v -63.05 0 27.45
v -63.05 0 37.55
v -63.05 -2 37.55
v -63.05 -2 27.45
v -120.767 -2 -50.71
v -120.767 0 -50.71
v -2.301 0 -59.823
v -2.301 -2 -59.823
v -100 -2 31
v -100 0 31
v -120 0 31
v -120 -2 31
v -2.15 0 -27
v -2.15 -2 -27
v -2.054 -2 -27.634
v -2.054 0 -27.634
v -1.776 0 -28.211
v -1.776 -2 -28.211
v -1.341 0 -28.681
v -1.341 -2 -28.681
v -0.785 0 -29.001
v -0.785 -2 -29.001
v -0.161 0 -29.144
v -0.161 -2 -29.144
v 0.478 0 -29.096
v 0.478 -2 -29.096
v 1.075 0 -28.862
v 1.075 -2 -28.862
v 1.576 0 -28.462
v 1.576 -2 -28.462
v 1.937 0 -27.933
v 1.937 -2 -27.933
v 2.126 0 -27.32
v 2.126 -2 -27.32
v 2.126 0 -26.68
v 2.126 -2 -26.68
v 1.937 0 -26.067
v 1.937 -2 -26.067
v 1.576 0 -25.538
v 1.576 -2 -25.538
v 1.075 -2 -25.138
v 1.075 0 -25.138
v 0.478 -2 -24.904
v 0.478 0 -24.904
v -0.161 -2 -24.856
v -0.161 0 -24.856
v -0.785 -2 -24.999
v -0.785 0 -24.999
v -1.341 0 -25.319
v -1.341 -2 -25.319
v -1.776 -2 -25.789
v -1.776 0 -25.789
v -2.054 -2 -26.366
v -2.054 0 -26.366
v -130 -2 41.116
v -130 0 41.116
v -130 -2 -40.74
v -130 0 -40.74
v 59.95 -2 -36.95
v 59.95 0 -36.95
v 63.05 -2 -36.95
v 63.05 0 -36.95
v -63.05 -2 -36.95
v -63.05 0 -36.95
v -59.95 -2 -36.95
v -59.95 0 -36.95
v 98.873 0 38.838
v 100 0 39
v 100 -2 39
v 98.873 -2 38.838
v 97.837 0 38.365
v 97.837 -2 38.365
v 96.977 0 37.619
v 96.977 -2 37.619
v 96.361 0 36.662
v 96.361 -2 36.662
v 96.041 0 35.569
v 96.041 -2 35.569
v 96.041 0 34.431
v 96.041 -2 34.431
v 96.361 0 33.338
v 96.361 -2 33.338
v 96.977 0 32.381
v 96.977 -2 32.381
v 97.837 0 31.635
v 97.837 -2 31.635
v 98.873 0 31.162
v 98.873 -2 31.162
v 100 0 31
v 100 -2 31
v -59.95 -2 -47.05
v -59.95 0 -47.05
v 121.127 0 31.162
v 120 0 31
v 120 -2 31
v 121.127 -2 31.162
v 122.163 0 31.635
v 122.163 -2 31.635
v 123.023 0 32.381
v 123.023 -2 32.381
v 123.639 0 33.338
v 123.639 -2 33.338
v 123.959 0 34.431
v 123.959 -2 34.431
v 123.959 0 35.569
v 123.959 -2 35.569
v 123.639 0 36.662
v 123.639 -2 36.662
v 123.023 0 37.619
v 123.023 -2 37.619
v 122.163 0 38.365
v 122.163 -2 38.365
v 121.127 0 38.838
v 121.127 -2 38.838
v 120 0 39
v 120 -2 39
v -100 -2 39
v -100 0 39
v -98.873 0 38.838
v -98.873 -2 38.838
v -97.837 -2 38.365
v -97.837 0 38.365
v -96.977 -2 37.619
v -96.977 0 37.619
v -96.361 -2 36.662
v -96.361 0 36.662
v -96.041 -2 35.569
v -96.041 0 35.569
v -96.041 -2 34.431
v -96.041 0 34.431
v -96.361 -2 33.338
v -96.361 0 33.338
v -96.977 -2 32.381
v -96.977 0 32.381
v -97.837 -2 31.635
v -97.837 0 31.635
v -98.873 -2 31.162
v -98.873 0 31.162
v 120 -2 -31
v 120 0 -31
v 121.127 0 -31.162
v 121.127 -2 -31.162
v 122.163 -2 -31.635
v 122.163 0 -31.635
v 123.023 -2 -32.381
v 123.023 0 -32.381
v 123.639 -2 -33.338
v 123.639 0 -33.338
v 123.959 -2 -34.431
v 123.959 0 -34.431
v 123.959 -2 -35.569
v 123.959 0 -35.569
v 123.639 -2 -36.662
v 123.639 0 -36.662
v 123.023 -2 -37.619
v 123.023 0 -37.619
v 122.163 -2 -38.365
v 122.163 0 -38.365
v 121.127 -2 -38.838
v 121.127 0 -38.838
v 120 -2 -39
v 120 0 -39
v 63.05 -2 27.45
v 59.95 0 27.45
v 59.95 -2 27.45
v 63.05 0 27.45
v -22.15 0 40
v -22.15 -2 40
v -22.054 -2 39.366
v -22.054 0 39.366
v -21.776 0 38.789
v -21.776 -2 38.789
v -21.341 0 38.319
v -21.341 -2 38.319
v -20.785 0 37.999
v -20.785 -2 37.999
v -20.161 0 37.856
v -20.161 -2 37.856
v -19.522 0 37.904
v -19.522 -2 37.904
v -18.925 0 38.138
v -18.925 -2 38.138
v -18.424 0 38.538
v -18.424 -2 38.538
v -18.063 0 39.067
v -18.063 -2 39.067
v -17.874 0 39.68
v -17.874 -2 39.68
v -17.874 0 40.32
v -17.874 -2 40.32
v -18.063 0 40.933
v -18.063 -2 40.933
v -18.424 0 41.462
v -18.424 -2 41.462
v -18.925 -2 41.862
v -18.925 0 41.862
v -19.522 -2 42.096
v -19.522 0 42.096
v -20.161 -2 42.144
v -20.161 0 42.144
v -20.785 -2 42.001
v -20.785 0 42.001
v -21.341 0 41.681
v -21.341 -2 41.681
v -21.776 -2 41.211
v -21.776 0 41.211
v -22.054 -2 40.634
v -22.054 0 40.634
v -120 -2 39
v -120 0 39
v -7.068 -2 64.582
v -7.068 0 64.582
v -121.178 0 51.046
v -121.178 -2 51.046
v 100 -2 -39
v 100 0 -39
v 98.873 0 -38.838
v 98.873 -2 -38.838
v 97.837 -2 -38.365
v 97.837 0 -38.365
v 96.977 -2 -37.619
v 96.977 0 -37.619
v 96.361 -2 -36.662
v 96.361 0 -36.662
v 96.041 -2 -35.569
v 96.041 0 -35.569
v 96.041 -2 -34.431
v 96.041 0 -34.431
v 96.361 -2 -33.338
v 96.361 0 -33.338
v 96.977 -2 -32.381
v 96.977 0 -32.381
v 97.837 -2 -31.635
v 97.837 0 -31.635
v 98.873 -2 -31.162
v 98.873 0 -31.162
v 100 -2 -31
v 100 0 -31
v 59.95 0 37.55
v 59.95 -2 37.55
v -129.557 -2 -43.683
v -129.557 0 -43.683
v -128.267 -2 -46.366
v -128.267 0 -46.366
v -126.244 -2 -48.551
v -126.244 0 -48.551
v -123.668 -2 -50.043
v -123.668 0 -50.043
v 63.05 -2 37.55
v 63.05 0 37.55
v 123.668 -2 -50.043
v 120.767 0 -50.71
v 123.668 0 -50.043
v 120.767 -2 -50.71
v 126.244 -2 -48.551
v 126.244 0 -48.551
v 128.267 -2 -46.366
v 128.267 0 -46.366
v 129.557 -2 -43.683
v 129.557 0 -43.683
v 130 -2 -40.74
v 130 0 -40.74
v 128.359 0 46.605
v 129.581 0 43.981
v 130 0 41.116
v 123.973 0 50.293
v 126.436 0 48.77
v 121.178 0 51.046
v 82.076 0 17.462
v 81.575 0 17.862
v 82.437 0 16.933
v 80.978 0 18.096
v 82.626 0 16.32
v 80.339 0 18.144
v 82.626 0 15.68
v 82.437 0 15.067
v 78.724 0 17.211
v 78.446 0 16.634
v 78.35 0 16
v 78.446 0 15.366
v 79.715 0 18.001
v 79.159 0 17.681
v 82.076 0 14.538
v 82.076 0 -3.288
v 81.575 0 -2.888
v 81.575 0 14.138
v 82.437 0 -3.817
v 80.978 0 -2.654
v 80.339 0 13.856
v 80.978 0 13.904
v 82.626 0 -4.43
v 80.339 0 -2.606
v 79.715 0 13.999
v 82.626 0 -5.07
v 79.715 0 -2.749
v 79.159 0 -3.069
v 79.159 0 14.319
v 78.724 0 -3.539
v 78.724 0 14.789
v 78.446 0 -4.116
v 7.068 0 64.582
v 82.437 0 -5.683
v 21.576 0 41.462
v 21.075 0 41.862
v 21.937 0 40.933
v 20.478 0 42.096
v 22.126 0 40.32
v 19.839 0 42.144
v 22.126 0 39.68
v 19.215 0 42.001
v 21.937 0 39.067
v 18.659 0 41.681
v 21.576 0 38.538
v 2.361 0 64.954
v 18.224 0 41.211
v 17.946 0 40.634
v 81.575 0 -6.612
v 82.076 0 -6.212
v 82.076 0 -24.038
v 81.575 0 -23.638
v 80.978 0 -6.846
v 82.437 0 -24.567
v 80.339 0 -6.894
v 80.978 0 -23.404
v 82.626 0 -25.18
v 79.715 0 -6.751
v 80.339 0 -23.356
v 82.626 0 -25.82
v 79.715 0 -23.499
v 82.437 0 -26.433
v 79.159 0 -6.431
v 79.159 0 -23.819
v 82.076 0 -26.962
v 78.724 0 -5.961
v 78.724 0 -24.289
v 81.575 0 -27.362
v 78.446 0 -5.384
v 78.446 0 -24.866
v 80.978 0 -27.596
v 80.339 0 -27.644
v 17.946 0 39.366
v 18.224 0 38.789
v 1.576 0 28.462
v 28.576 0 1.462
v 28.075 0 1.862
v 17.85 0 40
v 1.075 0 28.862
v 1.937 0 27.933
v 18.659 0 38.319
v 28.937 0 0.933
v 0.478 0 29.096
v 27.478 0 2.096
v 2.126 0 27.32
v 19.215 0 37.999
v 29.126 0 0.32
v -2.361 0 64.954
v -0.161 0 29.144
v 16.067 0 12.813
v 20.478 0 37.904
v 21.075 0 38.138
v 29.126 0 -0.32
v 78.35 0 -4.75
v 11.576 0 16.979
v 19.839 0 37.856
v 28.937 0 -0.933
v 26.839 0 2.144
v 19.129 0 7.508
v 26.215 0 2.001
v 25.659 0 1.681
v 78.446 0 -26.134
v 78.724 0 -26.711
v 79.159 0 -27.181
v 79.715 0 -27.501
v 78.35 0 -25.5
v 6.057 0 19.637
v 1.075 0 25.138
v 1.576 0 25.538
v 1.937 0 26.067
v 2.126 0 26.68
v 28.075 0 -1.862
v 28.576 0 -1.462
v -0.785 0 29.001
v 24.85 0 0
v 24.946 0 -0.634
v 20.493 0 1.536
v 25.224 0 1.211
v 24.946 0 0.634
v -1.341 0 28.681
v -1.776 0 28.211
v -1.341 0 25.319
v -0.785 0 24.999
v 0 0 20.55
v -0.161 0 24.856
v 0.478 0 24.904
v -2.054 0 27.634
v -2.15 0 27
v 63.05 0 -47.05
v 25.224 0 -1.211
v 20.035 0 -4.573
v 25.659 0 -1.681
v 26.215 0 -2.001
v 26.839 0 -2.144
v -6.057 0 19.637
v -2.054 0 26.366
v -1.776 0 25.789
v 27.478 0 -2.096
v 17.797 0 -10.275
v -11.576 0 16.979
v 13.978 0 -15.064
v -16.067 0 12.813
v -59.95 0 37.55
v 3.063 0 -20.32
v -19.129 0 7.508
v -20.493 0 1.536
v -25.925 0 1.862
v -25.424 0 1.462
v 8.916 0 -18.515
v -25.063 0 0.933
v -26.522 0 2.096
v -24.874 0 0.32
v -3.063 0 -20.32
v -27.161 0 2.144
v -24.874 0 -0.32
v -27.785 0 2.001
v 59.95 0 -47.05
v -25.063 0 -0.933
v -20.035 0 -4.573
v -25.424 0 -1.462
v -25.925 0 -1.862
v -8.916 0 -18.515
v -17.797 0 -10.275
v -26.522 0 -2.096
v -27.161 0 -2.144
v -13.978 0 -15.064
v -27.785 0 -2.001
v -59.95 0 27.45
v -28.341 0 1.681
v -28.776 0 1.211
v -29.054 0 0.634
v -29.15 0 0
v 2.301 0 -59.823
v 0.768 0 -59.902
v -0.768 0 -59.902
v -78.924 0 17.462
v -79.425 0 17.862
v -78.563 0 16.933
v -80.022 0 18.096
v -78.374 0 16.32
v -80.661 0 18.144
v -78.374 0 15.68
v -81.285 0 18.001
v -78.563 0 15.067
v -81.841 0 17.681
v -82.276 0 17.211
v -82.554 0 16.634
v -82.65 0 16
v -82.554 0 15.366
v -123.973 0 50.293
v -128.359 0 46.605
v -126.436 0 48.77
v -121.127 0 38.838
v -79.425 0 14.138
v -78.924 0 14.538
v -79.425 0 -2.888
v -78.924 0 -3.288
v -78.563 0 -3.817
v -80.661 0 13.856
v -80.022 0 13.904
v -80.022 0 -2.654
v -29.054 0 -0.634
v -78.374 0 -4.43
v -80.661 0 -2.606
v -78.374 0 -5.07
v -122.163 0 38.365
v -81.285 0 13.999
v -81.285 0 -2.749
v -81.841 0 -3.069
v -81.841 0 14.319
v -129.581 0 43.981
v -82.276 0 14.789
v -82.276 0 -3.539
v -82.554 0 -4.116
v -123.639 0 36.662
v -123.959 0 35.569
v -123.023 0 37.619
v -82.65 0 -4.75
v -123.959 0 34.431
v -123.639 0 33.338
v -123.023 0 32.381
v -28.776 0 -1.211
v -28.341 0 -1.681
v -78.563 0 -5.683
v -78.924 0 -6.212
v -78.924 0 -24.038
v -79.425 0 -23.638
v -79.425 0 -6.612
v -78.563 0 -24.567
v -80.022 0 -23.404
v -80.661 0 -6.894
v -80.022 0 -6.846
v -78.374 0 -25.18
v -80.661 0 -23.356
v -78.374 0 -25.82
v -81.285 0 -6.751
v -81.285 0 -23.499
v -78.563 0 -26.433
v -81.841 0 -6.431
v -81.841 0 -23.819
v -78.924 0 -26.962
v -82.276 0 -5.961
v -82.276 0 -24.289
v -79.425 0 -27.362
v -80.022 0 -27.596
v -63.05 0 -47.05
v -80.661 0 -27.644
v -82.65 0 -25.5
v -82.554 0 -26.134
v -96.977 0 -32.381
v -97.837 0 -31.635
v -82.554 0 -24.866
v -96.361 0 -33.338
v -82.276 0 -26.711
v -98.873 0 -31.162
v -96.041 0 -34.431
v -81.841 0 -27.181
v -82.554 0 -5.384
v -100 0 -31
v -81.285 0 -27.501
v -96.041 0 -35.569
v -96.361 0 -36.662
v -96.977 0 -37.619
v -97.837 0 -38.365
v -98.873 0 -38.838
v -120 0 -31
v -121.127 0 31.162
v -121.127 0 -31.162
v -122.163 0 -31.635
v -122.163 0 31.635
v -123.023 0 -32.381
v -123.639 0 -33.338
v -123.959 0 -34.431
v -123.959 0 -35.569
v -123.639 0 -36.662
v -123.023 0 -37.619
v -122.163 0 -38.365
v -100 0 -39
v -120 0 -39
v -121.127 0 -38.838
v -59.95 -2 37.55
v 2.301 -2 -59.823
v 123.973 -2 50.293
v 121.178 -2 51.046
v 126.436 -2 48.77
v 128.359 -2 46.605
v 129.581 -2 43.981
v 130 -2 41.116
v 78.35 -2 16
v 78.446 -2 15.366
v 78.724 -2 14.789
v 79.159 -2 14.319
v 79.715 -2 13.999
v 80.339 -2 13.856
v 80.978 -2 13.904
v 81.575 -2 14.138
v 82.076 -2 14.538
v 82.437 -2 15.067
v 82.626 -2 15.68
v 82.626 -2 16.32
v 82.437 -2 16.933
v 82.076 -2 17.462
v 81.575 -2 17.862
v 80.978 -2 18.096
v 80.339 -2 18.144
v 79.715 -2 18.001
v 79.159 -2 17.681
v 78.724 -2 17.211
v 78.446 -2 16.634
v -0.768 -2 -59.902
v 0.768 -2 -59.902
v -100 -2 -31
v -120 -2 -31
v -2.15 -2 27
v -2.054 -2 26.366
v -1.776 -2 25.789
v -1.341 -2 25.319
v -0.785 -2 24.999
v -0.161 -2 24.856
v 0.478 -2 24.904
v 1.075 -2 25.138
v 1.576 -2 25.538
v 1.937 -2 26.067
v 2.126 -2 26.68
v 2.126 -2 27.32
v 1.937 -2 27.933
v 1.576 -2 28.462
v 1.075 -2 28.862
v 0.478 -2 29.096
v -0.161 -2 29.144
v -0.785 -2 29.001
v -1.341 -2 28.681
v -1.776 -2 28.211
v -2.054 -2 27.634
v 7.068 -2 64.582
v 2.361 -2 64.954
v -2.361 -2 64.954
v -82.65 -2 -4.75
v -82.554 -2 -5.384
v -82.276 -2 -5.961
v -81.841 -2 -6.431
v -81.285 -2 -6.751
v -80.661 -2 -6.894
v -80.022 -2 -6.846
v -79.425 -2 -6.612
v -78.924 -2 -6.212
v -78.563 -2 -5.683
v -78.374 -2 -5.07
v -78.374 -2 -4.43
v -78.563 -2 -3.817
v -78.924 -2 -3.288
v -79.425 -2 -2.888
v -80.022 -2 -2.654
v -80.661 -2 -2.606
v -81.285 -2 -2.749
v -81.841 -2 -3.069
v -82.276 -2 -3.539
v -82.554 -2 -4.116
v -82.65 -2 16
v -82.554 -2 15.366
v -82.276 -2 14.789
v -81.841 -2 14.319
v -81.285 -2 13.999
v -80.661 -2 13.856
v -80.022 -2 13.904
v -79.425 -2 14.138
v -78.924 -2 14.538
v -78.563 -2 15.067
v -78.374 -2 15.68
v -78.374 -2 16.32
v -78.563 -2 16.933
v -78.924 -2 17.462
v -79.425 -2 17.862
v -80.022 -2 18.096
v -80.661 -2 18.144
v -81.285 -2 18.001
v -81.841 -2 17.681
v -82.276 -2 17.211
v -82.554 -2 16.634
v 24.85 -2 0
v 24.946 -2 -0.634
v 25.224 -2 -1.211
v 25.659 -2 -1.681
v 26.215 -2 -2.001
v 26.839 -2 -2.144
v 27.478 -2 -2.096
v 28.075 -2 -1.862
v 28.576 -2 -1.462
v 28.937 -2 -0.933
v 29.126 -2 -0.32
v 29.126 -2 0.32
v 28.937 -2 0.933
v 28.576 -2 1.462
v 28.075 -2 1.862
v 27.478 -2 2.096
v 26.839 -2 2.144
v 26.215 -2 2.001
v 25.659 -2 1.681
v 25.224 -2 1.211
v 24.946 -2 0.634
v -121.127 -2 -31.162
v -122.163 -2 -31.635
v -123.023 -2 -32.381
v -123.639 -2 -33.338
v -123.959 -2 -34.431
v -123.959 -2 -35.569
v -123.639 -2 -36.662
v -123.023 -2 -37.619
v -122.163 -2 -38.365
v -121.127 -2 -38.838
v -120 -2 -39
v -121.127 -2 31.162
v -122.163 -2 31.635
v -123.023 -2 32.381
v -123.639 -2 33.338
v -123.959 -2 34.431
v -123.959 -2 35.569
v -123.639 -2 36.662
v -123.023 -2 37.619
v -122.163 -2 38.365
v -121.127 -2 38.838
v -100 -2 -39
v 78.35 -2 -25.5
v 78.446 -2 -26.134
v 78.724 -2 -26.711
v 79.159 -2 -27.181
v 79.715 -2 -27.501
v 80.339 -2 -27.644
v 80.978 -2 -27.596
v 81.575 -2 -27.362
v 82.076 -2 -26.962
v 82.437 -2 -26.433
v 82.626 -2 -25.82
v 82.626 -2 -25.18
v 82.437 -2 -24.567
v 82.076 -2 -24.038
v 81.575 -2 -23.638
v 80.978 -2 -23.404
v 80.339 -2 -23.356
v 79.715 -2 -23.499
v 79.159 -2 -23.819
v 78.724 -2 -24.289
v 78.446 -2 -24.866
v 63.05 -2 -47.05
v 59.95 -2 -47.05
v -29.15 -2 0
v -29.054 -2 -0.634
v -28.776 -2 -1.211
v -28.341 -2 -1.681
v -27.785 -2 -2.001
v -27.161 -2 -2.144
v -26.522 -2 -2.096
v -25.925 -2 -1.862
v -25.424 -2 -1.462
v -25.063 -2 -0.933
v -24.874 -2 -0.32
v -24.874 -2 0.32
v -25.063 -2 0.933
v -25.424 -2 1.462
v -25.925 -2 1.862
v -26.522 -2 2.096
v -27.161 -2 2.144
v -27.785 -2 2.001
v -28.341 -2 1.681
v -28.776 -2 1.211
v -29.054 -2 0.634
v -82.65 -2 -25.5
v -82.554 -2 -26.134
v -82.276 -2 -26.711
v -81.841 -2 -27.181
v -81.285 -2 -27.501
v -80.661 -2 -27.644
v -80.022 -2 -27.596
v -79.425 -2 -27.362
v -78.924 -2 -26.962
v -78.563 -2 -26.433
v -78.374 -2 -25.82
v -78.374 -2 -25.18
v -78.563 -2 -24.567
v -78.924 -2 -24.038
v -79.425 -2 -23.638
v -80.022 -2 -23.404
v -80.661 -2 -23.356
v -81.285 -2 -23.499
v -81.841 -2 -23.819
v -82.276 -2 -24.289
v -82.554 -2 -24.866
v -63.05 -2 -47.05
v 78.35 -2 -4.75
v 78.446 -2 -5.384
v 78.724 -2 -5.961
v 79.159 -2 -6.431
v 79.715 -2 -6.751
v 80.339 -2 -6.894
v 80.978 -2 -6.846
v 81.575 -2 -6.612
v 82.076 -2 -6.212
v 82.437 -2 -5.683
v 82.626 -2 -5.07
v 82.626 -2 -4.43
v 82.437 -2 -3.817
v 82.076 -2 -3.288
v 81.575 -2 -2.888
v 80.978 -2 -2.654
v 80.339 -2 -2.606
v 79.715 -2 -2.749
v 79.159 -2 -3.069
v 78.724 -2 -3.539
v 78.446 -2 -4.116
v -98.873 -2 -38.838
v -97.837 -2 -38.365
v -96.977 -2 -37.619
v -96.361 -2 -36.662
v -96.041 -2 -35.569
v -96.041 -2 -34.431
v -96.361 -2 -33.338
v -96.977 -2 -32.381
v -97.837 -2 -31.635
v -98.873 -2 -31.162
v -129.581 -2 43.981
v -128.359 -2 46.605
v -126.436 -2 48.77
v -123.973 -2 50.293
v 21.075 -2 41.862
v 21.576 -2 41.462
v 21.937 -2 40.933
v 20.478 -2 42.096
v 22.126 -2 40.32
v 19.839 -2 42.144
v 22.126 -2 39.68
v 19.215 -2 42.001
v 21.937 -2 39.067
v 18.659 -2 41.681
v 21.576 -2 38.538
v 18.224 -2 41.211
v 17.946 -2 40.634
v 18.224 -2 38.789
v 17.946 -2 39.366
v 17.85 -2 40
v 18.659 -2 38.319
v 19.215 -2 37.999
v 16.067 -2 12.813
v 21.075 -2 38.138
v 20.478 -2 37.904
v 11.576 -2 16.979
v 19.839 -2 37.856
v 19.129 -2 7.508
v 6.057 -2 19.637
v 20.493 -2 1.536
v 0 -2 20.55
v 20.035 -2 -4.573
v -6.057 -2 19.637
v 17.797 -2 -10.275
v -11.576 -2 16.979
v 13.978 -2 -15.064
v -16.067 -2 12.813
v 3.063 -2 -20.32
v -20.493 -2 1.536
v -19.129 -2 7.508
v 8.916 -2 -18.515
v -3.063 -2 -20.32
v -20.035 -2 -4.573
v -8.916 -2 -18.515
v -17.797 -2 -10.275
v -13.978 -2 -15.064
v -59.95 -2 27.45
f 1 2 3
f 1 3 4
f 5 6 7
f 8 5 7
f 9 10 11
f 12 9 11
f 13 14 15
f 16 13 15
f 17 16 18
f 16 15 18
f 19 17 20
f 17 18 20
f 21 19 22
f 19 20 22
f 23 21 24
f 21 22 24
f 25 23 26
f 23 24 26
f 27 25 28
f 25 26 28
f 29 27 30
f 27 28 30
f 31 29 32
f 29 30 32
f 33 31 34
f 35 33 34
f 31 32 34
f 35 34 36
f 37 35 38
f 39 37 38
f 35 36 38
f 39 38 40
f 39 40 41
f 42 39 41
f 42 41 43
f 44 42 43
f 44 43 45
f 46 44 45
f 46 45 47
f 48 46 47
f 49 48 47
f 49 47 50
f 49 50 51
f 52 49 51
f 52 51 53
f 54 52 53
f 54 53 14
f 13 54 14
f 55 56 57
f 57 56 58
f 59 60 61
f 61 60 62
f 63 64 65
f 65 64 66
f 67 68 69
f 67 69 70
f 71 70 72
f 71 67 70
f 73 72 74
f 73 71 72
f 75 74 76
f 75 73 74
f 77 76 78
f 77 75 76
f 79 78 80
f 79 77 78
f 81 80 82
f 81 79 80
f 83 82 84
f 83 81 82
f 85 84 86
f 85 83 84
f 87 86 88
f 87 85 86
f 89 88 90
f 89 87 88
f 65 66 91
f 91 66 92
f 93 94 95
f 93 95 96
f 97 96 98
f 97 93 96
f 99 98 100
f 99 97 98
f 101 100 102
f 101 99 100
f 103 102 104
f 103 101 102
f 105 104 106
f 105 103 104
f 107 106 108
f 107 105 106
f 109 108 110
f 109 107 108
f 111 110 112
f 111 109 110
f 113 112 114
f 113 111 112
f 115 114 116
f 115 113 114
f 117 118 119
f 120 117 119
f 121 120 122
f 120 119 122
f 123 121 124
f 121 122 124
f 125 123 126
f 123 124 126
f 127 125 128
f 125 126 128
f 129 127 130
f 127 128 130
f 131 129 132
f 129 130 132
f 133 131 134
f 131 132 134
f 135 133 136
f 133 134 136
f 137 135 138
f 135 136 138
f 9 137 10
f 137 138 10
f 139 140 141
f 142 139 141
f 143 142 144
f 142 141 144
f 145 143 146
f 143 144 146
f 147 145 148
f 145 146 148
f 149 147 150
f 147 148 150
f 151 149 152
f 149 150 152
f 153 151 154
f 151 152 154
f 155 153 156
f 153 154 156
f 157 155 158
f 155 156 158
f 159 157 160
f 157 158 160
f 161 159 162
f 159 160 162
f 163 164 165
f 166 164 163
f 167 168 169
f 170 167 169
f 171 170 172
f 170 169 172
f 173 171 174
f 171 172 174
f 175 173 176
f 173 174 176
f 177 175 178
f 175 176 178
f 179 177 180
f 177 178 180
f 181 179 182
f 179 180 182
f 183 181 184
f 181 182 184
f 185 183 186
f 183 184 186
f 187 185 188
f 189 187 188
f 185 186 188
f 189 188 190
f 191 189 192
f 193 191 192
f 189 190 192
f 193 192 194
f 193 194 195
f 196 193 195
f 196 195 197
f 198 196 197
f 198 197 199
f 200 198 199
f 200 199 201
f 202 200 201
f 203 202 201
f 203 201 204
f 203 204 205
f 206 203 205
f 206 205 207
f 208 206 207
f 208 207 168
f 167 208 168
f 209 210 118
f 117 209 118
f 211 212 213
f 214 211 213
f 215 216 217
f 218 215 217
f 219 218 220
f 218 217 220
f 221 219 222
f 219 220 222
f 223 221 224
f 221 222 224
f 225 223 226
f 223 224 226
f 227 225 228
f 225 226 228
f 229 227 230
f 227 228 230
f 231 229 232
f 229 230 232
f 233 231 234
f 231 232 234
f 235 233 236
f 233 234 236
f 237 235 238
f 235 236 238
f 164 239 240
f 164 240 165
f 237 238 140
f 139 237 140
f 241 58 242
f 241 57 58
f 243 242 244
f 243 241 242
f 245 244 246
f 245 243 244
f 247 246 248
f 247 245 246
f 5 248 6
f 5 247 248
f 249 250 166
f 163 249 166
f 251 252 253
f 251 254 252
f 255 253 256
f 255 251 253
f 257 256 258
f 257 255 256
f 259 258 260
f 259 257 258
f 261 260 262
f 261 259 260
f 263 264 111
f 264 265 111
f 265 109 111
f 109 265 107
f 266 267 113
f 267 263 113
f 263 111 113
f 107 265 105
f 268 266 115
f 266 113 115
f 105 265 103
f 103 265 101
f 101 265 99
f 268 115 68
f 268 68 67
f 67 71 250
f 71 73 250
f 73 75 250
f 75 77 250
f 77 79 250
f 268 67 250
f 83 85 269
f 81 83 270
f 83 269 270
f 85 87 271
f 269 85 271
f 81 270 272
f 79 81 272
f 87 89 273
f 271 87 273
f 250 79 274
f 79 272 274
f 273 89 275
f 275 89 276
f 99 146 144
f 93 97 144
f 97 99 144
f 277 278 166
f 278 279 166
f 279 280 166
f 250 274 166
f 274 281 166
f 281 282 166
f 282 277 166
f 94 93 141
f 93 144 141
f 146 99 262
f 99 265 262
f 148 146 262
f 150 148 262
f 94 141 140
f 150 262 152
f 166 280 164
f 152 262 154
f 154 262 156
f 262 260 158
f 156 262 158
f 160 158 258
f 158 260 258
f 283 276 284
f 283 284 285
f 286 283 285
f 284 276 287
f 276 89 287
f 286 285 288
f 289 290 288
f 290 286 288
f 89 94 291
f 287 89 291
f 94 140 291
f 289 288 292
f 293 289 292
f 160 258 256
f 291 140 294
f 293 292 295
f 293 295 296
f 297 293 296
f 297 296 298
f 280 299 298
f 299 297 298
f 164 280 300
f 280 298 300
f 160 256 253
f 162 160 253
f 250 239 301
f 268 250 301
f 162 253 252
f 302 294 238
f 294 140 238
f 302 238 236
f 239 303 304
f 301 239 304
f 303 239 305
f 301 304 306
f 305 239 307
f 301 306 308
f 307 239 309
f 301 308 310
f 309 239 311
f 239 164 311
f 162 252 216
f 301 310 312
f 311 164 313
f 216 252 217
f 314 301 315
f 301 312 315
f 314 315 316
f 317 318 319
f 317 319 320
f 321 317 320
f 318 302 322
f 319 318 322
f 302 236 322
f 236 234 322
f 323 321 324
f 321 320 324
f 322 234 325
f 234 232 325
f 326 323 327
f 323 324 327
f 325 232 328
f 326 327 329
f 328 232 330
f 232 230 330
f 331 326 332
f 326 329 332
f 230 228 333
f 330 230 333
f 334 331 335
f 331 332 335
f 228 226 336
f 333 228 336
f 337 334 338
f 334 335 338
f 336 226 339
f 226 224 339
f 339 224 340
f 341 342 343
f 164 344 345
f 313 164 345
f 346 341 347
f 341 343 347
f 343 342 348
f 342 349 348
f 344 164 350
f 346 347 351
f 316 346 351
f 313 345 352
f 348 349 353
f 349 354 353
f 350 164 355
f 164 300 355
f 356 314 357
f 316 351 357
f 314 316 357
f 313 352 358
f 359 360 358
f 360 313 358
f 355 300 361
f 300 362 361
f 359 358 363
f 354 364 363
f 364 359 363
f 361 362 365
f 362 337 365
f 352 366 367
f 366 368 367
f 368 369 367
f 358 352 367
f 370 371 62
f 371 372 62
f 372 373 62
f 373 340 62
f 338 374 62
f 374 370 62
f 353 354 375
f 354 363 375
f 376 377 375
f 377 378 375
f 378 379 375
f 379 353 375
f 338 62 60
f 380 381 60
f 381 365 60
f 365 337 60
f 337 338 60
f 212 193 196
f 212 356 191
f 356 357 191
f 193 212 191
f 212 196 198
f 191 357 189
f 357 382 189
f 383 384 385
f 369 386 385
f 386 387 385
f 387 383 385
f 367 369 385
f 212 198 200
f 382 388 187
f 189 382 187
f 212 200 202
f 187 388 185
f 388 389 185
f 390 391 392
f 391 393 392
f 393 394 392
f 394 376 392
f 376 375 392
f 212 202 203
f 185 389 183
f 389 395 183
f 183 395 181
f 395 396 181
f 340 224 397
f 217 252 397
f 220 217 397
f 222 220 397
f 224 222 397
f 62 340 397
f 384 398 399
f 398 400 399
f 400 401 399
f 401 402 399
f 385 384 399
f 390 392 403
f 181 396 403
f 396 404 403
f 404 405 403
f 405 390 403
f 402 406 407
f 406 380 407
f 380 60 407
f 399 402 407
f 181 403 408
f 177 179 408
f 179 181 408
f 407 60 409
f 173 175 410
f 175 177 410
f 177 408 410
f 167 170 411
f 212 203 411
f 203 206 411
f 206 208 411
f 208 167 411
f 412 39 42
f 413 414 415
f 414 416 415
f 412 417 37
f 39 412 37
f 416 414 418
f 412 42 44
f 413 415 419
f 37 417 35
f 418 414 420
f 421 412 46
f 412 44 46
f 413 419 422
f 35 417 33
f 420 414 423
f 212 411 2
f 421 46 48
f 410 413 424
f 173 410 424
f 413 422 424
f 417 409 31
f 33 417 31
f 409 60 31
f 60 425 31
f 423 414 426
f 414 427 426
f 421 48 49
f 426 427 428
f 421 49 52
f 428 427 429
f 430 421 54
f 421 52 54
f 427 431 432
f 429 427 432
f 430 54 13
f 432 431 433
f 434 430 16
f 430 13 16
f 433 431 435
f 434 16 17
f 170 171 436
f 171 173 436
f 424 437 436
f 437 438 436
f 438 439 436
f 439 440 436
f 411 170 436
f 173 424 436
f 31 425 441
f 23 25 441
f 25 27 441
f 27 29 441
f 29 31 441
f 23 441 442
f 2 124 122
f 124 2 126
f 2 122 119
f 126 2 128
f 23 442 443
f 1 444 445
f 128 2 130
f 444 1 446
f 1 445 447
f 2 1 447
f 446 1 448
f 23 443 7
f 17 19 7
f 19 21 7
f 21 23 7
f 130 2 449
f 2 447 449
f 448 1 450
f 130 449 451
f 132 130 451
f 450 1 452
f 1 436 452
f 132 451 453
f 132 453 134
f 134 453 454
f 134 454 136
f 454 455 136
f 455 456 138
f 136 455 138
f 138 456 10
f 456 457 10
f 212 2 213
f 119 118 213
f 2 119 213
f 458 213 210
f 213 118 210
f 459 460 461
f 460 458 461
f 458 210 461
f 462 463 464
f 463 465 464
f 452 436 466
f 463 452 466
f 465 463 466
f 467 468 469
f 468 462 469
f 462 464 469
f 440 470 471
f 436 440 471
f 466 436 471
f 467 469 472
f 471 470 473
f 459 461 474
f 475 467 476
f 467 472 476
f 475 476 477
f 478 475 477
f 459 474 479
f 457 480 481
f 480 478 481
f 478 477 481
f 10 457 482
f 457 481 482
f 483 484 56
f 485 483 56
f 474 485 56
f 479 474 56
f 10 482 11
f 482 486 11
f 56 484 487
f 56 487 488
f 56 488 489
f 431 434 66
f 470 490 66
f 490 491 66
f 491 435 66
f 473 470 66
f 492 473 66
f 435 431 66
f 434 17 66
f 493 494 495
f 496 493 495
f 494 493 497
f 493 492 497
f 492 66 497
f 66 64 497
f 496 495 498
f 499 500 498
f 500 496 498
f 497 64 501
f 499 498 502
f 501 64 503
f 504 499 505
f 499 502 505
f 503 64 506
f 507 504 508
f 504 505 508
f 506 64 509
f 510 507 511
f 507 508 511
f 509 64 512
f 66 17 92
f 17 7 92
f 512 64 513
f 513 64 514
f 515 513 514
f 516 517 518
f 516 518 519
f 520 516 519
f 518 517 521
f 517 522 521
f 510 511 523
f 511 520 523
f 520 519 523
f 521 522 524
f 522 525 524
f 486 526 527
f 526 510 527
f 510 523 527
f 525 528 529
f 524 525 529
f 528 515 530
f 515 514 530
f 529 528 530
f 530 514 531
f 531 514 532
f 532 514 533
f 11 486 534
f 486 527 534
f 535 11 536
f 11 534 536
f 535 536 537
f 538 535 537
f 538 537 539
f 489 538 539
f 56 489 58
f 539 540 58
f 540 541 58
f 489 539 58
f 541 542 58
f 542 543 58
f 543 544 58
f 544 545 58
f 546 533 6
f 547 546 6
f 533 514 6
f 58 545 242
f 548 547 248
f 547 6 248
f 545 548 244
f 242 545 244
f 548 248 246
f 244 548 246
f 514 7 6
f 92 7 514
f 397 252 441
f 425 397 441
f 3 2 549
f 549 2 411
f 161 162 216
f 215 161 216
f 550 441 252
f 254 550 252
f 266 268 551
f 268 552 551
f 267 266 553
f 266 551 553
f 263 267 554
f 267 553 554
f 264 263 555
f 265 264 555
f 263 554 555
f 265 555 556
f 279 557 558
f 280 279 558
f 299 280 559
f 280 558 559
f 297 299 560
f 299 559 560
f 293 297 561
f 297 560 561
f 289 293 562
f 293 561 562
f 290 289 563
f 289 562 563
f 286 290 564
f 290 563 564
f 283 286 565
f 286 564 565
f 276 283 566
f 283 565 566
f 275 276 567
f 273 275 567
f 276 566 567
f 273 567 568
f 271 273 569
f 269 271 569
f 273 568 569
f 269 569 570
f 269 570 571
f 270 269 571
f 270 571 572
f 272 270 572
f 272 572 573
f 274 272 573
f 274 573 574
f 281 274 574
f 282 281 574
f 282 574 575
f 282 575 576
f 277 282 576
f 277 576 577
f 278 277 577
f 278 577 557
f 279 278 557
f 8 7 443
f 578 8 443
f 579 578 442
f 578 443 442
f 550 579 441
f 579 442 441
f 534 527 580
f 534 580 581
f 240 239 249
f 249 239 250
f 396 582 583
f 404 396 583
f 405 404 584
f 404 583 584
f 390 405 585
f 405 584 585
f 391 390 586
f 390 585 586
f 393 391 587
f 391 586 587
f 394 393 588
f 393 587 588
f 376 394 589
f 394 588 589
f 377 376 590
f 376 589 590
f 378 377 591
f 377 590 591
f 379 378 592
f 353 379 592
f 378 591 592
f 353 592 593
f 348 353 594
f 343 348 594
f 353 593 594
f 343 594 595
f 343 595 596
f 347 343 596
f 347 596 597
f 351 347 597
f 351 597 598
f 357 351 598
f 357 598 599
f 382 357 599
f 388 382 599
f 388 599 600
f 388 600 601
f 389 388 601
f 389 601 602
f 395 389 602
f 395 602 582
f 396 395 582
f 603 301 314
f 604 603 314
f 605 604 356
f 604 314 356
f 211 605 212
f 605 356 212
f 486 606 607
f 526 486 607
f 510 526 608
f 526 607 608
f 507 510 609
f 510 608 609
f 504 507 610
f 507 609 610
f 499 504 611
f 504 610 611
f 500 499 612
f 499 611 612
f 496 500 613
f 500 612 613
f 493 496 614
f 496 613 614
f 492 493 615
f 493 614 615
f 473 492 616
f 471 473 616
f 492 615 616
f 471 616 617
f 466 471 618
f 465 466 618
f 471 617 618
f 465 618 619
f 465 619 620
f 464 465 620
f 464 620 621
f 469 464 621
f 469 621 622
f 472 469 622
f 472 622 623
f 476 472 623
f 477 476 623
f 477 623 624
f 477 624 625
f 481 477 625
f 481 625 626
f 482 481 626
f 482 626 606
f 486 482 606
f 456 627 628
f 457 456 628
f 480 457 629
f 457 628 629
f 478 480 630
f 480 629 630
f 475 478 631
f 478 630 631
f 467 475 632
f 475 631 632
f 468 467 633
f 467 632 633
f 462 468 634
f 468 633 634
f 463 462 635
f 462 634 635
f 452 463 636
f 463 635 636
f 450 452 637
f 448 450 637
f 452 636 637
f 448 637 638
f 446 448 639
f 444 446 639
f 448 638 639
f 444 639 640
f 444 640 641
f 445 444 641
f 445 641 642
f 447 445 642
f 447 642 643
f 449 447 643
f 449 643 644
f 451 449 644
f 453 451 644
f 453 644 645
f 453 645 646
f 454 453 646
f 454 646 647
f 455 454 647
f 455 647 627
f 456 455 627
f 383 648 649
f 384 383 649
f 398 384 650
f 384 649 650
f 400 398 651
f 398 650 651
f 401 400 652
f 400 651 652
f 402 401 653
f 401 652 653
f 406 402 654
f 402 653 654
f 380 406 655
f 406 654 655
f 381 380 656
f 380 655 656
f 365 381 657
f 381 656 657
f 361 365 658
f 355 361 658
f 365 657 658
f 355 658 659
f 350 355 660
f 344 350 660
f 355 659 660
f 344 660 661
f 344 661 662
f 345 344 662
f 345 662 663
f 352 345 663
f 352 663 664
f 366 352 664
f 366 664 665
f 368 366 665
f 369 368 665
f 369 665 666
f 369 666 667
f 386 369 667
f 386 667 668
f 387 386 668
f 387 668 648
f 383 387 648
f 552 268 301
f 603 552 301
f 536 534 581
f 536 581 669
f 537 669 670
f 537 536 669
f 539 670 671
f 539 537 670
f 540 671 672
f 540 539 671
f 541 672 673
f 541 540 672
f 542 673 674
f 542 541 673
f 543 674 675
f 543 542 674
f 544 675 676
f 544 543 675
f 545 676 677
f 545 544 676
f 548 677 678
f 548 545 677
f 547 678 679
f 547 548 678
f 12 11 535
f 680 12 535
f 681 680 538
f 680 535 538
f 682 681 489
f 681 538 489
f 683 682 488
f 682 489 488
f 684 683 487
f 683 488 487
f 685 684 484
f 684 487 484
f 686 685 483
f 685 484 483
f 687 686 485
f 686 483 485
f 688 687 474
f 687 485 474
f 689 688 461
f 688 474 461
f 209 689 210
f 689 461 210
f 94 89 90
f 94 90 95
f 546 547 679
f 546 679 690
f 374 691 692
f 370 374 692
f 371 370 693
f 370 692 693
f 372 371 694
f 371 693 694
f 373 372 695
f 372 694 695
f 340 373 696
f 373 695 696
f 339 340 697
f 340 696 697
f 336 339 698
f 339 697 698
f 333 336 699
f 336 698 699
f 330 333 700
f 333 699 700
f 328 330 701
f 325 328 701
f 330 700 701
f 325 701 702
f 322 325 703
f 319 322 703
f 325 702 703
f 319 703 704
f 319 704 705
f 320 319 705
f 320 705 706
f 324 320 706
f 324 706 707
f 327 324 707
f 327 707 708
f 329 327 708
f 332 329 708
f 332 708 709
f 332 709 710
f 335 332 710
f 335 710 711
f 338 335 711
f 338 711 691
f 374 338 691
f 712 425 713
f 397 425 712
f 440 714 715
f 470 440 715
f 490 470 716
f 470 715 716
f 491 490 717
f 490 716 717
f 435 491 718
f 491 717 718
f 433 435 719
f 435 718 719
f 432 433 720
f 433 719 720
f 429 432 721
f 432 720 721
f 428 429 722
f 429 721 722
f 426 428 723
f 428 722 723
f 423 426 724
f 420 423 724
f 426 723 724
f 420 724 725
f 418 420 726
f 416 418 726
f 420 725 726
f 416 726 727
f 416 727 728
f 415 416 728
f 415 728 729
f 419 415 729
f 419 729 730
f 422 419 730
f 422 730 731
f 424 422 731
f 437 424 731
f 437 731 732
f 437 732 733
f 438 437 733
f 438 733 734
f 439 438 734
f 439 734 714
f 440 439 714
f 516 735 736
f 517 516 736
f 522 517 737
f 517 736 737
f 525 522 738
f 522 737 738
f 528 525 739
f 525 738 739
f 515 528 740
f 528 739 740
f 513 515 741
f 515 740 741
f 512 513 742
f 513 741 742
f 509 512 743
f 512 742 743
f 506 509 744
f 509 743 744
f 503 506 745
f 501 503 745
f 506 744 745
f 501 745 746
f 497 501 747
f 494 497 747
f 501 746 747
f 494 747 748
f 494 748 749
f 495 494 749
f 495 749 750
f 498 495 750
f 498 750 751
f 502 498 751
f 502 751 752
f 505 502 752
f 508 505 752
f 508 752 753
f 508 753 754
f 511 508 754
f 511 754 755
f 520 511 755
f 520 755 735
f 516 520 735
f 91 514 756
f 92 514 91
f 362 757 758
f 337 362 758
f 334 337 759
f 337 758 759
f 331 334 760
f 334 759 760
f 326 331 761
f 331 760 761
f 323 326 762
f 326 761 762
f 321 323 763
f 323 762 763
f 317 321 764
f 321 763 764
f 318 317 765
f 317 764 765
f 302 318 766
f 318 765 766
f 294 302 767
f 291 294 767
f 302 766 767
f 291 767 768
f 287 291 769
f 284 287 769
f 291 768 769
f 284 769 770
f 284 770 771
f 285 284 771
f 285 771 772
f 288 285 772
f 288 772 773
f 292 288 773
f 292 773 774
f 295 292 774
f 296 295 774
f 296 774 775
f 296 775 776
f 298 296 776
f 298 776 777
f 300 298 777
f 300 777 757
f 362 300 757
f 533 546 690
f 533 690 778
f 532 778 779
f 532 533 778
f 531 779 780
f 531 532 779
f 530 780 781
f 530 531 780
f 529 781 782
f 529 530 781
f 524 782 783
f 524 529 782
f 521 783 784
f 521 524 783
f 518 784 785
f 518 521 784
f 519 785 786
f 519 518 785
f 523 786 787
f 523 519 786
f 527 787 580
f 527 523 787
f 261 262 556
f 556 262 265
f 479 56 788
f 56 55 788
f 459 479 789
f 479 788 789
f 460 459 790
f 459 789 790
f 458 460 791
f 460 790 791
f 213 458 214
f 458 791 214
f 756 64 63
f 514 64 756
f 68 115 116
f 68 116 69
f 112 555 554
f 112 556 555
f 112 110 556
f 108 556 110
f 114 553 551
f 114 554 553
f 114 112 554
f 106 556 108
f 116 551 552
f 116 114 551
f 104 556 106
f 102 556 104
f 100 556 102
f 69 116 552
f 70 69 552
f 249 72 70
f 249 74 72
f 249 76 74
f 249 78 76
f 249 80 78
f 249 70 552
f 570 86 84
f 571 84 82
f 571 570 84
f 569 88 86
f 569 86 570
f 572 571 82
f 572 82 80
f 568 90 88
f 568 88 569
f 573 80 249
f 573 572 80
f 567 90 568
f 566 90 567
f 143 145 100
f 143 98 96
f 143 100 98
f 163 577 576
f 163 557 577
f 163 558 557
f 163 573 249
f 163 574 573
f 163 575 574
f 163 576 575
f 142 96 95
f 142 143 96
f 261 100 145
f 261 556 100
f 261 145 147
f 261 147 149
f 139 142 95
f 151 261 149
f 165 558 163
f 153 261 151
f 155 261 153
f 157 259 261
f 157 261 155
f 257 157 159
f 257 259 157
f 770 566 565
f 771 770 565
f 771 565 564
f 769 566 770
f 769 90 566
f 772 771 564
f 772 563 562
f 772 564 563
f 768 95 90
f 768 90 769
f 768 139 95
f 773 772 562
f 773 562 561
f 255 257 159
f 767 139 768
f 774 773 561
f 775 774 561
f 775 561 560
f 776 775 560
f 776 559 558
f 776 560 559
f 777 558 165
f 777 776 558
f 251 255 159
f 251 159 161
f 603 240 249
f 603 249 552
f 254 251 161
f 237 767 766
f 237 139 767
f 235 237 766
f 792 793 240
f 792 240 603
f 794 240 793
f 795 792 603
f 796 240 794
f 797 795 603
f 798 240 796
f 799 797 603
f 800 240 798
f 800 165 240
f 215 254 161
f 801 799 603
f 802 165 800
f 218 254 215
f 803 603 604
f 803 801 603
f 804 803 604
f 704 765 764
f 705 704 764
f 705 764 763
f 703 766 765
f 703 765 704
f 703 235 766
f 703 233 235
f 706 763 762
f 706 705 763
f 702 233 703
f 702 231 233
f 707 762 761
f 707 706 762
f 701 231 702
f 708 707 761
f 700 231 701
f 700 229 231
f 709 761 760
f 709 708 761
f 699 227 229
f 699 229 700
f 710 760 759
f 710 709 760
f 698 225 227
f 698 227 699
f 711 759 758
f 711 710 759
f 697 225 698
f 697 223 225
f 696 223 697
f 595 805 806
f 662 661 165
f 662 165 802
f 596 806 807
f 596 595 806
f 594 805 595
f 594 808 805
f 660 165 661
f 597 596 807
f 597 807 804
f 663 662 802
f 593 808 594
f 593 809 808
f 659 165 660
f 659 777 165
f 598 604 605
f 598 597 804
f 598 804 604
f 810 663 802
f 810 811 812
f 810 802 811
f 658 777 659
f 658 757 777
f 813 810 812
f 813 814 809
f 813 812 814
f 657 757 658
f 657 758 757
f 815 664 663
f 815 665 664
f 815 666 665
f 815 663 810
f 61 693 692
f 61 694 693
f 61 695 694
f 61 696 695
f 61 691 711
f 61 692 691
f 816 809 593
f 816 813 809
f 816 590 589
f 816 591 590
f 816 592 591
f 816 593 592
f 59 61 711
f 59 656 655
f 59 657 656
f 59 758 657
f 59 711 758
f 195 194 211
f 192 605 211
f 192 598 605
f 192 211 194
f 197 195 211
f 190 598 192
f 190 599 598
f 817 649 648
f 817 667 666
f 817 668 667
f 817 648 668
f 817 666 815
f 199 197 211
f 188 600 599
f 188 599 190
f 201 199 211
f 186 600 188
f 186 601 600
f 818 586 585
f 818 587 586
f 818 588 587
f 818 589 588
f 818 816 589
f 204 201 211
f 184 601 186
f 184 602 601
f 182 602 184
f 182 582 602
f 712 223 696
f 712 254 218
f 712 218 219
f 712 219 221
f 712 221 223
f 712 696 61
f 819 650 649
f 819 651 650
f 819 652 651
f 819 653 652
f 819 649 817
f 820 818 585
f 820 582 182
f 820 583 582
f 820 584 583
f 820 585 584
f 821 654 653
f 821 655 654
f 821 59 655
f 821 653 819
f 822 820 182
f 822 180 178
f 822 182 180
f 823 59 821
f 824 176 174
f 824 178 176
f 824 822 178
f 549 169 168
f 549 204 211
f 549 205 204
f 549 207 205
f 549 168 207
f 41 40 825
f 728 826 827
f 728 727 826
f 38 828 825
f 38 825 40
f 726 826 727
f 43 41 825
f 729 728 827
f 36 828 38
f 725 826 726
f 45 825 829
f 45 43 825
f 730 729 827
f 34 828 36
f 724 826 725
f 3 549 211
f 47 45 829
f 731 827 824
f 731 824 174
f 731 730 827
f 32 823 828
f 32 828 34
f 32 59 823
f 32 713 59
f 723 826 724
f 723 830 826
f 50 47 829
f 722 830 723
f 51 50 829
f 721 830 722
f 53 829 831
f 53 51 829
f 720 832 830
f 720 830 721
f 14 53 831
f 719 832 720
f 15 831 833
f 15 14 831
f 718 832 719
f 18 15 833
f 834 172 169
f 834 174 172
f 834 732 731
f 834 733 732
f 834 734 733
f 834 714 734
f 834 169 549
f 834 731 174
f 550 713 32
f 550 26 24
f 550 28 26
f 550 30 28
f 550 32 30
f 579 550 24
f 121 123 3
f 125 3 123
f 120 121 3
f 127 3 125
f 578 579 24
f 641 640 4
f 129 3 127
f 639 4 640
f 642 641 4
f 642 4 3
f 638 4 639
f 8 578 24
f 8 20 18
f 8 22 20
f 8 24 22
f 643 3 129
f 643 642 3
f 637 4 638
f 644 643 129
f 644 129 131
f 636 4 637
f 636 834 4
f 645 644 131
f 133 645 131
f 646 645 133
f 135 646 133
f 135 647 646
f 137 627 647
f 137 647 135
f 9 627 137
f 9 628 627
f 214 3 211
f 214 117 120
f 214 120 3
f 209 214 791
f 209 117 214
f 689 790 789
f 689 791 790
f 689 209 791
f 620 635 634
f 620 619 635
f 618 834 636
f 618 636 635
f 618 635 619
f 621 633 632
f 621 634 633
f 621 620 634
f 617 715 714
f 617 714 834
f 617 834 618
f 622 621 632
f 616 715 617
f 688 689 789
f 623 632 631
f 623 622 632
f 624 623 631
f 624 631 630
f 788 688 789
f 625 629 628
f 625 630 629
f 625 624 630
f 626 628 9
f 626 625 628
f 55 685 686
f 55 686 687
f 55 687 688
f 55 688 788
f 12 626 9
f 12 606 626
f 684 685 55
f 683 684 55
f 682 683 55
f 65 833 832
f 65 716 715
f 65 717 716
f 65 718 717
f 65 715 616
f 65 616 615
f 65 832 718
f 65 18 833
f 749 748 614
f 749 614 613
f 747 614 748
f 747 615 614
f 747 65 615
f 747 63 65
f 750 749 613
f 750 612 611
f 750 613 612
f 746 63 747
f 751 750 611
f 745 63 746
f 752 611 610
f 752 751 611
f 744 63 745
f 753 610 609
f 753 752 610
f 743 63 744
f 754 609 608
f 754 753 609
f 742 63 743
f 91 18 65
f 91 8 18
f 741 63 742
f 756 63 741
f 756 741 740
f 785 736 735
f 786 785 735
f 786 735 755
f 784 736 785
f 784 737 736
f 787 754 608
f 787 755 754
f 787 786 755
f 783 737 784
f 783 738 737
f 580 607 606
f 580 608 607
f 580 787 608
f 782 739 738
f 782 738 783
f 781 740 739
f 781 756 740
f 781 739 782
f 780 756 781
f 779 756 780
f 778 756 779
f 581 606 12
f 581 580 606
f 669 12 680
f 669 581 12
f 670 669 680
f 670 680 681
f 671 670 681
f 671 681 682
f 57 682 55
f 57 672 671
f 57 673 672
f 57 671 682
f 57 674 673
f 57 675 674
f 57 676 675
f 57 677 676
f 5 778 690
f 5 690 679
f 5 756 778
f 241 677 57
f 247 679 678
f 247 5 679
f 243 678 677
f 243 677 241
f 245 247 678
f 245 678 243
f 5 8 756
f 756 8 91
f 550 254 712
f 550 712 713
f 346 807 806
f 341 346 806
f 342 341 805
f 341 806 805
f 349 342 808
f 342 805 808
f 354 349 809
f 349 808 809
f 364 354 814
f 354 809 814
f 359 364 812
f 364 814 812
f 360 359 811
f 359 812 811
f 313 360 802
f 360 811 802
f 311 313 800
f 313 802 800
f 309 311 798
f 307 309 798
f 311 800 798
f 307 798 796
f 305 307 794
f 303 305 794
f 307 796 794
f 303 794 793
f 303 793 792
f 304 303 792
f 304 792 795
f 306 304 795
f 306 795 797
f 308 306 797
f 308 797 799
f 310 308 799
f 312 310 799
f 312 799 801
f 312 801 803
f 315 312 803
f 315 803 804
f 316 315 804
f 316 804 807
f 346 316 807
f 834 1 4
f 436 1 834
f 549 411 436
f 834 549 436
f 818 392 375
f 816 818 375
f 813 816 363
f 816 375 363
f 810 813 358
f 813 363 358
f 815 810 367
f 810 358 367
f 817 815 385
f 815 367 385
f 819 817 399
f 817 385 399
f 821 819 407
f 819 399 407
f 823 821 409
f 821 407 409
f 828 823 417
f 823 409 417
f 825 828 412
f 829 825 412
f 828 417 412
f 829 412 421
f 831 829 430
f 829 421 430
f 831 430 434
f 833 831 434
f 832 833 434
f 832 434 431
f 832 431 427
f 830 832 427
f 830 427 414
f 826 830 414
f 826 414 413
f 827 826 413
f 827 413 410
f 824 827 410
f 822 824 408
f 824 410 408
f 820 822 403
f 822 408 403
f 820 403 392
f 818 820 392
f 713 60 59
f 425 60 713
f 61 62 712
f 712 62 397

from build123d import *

# Parameters (mm, degrees)
SKETCH1_R                = 20.55
SKETCH1_R_2              = 1
SKETCH1_W                = 3.1
SKETCH1_H                = 10.1
BASE_FLANGE1_DEPTH       = 2
FILLET1_R                = 10
M4_CLEARANCE_HOLE2_D     = 4.3
M4_CLEARANCE_HOLE2_DEPTH = 136
M4_CLEARANCE_HOLE2_TIP   = 1.291850331


# Sheet-metal steps are written as plain solids
with BuildPart() as part:
    # Sketch1 → Base-Flange1 (new body)
    with BuildSketch(Plane(origin=(0, 0, 0), x_dir=(1, 0, 0), z_dir=(0, 1, 0))):
        with BuildLine():
            Line((-130, -50), (-130, 50))
            Line((-130, 50), (-2.300894967, 59.823008079))
            ThreePointArc((-2.300894967, 59.823008079), (0, 59.911373514), (2.300894967, 59.823008079))
            Line((2.300894967, 59.823008079), (130, 50))
            Line((130, 50), (130, -50))
            Line((130, -50), (7.067672556, -64.582279284))
            ThreePointArc((7.067672556, -64.582279284), (0, -65), (-7.067672556, -64.582279284))
            Line((-7.067672556, -64.582279284), (-130, -50))
        make_face()
        with Locations(Location((0, 0, 0), (0, 0, 270))):
            Circle(SKETCH1_R, mode=Mode.SUBTRACT)
        with Locations(Location((0, 27, 0), (0, 0, 270))):
            Circle(SKETCH1_R_2, mode=Mode.SUBTRACT)
        with Locations(Location((-80.5, 25.5, 0), (0, 0, 270))):
            Circle(SKETCH1_R_2, mode=Mode.SUBTRACT)
        with Locations(Location((-80.5, 4.75, 0), (0, 0, 270))):
            Circle(SKETCH1_R_2, mode=Mode.SUBTRACT)
        with Locations(Location((-80.5, -16, 0), (0, 0, 270))):
            Circle(SKETCH1_R_2, mode=Mode.SUBTRACT)
        with Locations(Location((80.5, -16, 0), (0, 0, 90))):
            Circle(SKETCH1_R_2, mode=Mode.SUBTRACT)
        with Locations(Location((80.5, 4.75, 0), (0, 0, 90))):
            Circle(SKETCH1_R_2, mode=Mode.SUBTRACT)
        with Locations(Location((80.5, 25.5, 0), (0, 0, 90))):
            Circle(SKETCH1_R_2, mode=Mode.SUBTRACT)
        with Locations(Location((27, 0, 0), (0, 0, 270))):
            Circle(SKETCH1_R_2, mode=Mode.SUBTRACT)
        with Locations(Location((0, -27, 0), (0, 0, 270))):
            Circle(SKETCH1_R_2, mode=Mode.SUBTRACT)
        with Locations(Location((-27, 0, 0), (0, 0, 270))):
            Circle(SKETCH1_R_2, mode=Mode.SUBTRACT)
        with Locations(Location((20, -40, 0), (0, 0, 270))):
            Circle(SKETCH1_R_2, mode=Mode.SUBTRACT)
        with Locations(Location((-20, -40, 0), (0, 0, 270))):
            Circle(SKETCH1_R_2, mode=Mode.SUBTRACT)
        with Locations((-61.5, 42)):
            Rectangle(SKETCH1_W, SKETCH1_H, mode=Mode.SUBTRACT)
        with Locations((-61.5, -32.5)):
            Rectangle(SKETCH1_W, SKETCH1_H, mode=Mode.SUBTRACT)
        with Locations((61.5, -32.5)):
            Rectangle(SKETCH1_W, SKETCH1_H, mode=Mode.SUBTRACT)
        with Locations((61.5, 42)):
            Rectangle(SKETCH1_W, SKETCH1_H, mode=Mode.SUBTRACT)
        with BuildLine():
            Line((-120, 39), (-100, 39))
            ThreePointArc((-100, 39), (-96, 35), (-100, 31))
            Line((-100, 31), (-120, 31))
            ThreePointArc((-120, 31), (-124, 35), (-120, 39))
        make_face(mode=Mode.SUBTRACT)
        with BuildLine():
            Line((120, 39), (100, 39))
            ThreePointArc((100, 39), (96, 35), (100, 31))
            Line((100, 31), (120, 31))
            ThreePointArc((120, 31), (124, 35), (120, 39))
        make_face(mode=Mode.SUBTRACT)
        with BuildLine():
            Line((120, -39), (100, -39))
            ThreePointArc((100, -39), (96, -35), (100, -31))
            Line((100, -31), (120, -31))
            ThreePointArc((120, -31), (124, -35), (120, -39))
        make_face(mode=Mode.SUBTRACT)
        with BuildLine():
            Line((-120, -39), (-100, -39))
            ThreePointArc((-100, -39), (-96, -35), (-100, -31))
            Line((-100, -31), (-120, -31))
            ThreePointArc((-120, -31), (-124, -35), (-120, -39))
        make_face(mode=Mode.SUBTRACT)
    extrude(amount=-BASE_FLANGE1_DEPTH)

    # Fillet1
    fillet1_edges = [part.edges().sort_by_distance(p)[0] for p in [
        (130, -1, -50),
        (130, -1, 50),
        (-130, -1, 50),
        (-130, -1, -50),
    ]]
    fillet(fillet1_edges, radius=FILLET1_R)

    # M4 Clearance Hole2
    with Locations(Plane(origin=(0, 0, 0), x_dir=(1, 0, 0), z_dir=(0, 1, 0))):
        with Locations((-27, 0), (0, 27), (27, 0), (0, -27), (20, -40), (-20, -40), (80.5, -16), (80.5, 25.5), (80.5, 4.75), (-80.5, 25.5), (-80.5, 4.75), (-80.5, -16)):
            Hole(M4_CLEARANCE_HOLE2_D / 2, depth=M4_CLEARANCE_HOLE2_DEPTH)
            with Locations((0, 0, -(M4_CLEARANCE_HOLE2_DEPTH + M4_CLEARANCE_HOLE2_TIP / 2))):  # 118° drill point
                Cone(0, M4_CLEARANCE_HOLE2_D / 2, M4_CLEARANCE_HOLE2_TIP, mode=Mode.SUBTRACT)


solid = part.part
